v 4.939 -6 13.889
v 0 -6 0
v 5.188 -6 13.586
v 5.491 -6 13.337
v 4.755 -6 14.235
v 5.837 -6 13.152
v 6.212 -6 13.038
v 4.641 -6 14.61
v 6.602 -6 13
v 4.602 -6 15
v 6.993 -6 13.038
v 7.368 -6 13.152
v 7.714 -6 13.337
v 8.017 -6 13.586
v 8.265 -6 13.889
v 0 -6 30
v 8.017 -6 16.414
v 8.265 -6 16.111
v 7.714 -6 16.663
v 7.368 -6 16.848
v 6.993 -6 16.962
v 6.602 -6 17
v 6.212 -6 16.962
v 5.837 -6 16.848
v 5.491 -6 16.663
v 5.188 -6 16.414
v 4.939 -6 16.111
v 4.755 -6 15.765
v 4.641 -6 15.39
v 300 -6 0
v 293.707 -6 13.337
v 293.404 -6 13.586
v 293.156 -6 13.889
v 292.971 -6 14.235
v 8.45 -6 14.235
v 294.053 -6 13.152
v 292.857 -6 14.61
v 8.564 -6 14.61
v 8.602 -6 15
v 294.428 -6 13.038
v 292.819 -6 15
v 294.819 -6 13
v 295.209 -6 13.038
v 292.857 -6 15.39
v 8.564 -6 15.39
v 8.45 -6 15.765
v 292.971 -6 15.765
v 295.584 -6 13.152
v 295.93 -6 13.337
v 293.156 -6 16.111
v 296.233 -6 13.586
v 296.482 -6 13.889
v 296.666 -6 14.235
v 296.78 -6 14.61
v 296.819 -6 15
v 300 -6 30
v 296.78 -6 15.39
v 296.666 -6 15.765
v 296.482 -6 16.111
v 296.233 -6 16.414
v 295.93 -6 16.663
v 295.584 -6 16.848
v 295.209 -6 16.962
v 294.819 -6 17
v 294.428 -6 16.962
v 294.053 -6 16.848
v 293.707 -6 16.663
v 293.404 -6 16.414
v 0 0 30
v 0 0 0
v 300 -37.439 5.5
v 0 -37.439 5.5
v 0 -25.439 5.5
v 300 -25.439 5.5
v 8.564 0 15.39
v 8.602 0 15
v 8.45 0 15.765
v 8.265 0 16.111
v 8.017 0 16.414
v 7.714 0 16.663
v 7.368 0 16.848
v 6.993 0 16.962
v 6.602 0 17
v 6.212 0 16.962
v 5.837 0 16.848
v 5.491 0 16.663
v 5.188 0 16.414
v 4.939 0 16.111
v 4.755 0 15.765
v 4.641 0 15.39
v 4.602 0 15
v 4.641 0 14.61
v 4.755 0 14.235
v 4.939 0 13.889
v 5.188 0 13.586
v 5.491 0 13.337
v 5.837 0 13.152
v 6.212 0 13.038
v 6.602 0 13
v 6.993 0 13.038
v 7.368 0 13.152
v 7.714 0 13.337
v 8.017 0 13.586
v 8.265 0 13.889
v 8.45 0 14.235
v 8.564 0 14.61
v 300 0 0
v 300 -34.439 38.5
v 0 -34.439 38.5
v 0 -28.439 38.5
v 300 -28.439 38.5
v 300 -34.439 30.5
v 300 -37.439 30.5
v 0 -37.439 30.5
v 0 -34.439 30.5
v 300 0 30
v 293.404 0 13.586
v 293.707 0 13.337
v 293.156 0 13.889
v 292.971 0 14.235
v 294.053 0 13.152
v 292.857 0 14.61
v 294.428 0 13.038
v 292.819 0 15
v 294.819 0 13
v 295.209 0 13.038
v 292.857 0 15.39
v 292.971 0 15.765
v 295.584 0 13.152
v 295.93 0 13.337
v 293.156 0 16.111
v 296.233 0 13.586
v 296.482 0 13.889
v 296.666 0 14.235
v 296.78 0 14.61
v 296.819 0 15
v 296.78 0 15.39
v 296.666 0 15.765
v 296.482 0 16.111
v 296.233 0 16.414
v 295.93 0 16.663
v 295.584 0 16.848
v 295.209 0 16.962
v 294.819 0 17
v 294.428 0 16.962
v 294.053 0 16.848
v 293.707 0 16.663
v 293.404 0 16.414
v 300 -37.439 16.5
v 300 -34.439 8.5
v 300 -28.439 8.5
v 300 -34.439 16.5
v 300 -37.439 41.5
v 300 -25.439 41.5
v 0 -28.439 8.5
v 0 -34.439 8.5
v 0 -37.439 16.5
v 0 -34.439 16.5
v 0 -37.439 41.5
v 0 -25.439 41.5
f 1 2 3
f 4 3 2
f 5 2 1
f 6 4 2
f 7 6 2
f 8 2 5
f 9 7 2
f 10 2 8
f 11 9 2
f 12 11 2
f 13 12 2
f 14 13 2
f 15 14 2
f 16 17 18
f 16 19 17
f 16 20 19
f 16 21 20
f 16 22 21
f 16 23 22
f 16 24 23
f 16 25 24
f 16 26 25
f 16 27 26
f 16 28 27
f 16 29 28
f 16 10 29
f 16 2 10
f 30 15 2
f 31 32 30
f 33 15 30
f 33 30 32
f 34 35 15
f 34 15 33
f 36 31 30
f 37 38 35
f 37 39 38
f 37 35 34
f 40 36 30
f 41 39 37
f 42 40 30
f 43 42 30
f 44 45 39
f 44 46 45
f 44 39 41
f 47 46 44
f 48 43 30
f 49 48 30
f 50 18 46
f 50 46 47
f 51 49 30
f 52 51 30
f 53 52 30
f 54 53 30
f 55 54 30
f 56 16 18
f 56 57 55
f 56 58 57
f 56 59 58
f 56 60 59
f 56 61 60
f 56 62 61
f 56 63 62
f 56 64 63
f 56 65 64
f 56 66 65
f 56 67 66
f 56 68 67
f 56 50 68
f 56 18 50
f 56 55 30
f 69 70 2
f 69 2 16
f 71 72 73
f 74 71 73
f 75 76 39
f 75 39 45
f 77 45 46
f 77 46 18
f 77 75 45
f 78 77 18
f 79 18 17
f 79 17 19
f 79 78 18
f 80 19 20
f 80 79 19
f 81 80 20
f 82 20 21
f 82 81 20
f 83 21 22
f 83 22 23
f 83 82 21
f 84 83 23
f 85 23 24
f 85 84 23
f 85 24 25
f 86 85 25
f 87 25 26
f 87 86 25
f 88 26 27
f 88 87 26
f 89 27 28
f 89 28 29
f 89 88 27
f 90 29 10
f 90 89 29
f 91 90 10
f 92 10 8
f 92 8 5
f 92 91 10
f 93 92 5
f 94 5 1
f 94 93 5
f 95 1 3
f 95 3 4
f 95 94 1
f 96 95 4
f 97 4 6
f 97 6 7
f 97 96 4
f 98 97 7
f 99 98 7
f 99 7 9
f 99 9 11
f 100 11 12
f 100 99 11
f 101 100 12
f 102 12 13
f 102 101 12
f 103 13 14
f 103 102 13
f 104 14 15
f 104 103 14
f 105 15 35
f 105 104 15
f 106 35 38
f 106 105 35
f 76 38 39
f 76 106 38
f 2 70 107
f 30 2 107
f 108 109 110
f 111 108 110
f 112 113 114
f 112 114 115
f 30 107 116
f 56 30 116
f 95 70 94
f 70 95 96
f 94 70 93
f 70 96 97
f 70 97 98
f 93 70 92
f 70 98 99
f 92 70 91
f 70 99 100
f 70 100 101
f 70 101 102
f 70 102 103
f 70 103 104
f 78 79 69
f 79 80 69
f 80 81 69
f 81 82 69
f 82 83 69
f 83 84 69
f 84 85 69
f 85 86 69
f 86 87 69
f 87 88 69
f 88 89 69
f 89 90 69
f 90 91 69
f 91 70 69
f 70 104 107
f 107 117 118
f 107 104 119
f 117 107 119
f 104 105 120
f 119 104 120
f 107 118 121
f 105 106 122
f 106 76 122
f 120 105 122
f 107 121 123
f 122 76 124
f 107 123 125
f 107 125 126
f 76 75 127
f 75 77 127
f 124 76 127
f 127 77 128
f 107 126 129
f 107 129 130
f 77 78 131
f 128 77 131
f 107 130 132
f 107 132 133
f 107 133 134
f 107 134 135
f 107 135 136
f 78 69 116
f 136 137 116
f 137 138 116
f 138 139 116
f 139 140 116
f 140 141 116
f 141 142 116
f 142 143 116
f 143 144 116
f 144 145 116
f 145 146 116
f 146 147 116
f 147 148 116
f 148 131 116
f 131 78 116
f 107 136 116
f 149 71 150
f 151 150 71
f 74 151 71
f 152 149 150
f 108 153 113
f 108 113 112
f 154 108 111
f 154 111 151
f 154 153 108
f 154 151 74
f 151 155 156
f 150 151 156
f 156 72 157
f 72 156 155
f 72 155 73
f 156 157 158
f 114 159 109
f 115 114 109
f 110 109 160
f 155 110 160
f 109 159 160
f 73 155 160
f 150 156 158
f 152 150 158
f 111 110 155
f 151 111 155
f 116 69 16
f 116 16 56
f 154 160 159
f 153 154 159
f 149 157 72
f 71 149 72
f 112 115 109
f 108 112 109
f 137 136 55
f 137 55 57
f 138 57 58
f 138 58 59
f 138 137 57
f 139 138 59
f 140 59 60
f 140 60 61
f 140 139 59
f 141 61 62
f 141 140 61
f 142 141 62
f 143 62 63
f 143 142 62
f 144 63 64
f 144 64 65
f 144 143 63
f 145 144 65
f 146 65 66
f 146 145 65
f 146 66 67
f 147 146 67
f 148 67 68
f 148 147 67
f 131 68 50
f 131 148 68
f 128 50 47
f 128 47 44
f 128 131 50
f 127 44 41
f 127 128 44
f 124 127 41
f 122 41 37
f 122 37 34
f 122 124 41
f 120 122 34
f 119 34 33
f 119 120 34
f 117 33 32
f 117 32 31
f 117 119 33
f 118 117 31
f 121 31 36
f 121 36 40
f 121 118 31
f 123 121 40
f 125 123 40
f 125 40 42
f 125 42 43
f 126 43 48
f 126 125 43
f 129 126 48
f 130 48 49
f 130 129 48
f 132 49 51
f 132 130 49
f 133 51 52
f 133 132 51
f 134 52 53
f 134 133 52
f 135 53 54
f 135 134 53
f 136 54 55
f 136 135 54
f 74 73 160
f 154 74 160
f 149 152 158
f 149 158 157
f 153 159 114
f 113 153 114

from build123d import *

# Parameters (mm, degrees)
F0_W     = 300
F0_H     = 30
F0_R     = 2
F1_DEPTH = 6
F3_DEPTH = 300


with BuildPart() as f1:
    # F0 (on Front) → F1 (new body)
    with BuildSketch(Plane.XZ):
        with Locations((150, 15)):
            Rectangle(F0_W, F0_H)
        with Locations((6.60236, 15)):
            Circle(F0_R, mode=Mode.SUBTRACT)
        with Locations((294.81864, 15)):
            Circle(F0_R, mode=Mode.SUBTRACT)
    extrude(amount=F1_DEPTH)


with BuildPart() as f3:
    # F2 (on Right) → F3 (new body)
    with BuildSketch(Plane.YZ):
        Polygon((-37.438527, 5.500001), (-25.438527, 5.500001), (-25.438527, 41.500001), (-37.438527, 41.500001), (-37.438527, 30.500001), (-34.438527, 30.500001), (-34.438527, 38.500001), (-28.438527, 38.500001), (-28.438527, 8.500001), (-34.438527, 8.500001), (-34.438527, 16.500001), (-37.438527, 16.500001), align=None)
    extrude(amount=F3_DEPTH)


solid = Compound([f1.part, f3.part])
